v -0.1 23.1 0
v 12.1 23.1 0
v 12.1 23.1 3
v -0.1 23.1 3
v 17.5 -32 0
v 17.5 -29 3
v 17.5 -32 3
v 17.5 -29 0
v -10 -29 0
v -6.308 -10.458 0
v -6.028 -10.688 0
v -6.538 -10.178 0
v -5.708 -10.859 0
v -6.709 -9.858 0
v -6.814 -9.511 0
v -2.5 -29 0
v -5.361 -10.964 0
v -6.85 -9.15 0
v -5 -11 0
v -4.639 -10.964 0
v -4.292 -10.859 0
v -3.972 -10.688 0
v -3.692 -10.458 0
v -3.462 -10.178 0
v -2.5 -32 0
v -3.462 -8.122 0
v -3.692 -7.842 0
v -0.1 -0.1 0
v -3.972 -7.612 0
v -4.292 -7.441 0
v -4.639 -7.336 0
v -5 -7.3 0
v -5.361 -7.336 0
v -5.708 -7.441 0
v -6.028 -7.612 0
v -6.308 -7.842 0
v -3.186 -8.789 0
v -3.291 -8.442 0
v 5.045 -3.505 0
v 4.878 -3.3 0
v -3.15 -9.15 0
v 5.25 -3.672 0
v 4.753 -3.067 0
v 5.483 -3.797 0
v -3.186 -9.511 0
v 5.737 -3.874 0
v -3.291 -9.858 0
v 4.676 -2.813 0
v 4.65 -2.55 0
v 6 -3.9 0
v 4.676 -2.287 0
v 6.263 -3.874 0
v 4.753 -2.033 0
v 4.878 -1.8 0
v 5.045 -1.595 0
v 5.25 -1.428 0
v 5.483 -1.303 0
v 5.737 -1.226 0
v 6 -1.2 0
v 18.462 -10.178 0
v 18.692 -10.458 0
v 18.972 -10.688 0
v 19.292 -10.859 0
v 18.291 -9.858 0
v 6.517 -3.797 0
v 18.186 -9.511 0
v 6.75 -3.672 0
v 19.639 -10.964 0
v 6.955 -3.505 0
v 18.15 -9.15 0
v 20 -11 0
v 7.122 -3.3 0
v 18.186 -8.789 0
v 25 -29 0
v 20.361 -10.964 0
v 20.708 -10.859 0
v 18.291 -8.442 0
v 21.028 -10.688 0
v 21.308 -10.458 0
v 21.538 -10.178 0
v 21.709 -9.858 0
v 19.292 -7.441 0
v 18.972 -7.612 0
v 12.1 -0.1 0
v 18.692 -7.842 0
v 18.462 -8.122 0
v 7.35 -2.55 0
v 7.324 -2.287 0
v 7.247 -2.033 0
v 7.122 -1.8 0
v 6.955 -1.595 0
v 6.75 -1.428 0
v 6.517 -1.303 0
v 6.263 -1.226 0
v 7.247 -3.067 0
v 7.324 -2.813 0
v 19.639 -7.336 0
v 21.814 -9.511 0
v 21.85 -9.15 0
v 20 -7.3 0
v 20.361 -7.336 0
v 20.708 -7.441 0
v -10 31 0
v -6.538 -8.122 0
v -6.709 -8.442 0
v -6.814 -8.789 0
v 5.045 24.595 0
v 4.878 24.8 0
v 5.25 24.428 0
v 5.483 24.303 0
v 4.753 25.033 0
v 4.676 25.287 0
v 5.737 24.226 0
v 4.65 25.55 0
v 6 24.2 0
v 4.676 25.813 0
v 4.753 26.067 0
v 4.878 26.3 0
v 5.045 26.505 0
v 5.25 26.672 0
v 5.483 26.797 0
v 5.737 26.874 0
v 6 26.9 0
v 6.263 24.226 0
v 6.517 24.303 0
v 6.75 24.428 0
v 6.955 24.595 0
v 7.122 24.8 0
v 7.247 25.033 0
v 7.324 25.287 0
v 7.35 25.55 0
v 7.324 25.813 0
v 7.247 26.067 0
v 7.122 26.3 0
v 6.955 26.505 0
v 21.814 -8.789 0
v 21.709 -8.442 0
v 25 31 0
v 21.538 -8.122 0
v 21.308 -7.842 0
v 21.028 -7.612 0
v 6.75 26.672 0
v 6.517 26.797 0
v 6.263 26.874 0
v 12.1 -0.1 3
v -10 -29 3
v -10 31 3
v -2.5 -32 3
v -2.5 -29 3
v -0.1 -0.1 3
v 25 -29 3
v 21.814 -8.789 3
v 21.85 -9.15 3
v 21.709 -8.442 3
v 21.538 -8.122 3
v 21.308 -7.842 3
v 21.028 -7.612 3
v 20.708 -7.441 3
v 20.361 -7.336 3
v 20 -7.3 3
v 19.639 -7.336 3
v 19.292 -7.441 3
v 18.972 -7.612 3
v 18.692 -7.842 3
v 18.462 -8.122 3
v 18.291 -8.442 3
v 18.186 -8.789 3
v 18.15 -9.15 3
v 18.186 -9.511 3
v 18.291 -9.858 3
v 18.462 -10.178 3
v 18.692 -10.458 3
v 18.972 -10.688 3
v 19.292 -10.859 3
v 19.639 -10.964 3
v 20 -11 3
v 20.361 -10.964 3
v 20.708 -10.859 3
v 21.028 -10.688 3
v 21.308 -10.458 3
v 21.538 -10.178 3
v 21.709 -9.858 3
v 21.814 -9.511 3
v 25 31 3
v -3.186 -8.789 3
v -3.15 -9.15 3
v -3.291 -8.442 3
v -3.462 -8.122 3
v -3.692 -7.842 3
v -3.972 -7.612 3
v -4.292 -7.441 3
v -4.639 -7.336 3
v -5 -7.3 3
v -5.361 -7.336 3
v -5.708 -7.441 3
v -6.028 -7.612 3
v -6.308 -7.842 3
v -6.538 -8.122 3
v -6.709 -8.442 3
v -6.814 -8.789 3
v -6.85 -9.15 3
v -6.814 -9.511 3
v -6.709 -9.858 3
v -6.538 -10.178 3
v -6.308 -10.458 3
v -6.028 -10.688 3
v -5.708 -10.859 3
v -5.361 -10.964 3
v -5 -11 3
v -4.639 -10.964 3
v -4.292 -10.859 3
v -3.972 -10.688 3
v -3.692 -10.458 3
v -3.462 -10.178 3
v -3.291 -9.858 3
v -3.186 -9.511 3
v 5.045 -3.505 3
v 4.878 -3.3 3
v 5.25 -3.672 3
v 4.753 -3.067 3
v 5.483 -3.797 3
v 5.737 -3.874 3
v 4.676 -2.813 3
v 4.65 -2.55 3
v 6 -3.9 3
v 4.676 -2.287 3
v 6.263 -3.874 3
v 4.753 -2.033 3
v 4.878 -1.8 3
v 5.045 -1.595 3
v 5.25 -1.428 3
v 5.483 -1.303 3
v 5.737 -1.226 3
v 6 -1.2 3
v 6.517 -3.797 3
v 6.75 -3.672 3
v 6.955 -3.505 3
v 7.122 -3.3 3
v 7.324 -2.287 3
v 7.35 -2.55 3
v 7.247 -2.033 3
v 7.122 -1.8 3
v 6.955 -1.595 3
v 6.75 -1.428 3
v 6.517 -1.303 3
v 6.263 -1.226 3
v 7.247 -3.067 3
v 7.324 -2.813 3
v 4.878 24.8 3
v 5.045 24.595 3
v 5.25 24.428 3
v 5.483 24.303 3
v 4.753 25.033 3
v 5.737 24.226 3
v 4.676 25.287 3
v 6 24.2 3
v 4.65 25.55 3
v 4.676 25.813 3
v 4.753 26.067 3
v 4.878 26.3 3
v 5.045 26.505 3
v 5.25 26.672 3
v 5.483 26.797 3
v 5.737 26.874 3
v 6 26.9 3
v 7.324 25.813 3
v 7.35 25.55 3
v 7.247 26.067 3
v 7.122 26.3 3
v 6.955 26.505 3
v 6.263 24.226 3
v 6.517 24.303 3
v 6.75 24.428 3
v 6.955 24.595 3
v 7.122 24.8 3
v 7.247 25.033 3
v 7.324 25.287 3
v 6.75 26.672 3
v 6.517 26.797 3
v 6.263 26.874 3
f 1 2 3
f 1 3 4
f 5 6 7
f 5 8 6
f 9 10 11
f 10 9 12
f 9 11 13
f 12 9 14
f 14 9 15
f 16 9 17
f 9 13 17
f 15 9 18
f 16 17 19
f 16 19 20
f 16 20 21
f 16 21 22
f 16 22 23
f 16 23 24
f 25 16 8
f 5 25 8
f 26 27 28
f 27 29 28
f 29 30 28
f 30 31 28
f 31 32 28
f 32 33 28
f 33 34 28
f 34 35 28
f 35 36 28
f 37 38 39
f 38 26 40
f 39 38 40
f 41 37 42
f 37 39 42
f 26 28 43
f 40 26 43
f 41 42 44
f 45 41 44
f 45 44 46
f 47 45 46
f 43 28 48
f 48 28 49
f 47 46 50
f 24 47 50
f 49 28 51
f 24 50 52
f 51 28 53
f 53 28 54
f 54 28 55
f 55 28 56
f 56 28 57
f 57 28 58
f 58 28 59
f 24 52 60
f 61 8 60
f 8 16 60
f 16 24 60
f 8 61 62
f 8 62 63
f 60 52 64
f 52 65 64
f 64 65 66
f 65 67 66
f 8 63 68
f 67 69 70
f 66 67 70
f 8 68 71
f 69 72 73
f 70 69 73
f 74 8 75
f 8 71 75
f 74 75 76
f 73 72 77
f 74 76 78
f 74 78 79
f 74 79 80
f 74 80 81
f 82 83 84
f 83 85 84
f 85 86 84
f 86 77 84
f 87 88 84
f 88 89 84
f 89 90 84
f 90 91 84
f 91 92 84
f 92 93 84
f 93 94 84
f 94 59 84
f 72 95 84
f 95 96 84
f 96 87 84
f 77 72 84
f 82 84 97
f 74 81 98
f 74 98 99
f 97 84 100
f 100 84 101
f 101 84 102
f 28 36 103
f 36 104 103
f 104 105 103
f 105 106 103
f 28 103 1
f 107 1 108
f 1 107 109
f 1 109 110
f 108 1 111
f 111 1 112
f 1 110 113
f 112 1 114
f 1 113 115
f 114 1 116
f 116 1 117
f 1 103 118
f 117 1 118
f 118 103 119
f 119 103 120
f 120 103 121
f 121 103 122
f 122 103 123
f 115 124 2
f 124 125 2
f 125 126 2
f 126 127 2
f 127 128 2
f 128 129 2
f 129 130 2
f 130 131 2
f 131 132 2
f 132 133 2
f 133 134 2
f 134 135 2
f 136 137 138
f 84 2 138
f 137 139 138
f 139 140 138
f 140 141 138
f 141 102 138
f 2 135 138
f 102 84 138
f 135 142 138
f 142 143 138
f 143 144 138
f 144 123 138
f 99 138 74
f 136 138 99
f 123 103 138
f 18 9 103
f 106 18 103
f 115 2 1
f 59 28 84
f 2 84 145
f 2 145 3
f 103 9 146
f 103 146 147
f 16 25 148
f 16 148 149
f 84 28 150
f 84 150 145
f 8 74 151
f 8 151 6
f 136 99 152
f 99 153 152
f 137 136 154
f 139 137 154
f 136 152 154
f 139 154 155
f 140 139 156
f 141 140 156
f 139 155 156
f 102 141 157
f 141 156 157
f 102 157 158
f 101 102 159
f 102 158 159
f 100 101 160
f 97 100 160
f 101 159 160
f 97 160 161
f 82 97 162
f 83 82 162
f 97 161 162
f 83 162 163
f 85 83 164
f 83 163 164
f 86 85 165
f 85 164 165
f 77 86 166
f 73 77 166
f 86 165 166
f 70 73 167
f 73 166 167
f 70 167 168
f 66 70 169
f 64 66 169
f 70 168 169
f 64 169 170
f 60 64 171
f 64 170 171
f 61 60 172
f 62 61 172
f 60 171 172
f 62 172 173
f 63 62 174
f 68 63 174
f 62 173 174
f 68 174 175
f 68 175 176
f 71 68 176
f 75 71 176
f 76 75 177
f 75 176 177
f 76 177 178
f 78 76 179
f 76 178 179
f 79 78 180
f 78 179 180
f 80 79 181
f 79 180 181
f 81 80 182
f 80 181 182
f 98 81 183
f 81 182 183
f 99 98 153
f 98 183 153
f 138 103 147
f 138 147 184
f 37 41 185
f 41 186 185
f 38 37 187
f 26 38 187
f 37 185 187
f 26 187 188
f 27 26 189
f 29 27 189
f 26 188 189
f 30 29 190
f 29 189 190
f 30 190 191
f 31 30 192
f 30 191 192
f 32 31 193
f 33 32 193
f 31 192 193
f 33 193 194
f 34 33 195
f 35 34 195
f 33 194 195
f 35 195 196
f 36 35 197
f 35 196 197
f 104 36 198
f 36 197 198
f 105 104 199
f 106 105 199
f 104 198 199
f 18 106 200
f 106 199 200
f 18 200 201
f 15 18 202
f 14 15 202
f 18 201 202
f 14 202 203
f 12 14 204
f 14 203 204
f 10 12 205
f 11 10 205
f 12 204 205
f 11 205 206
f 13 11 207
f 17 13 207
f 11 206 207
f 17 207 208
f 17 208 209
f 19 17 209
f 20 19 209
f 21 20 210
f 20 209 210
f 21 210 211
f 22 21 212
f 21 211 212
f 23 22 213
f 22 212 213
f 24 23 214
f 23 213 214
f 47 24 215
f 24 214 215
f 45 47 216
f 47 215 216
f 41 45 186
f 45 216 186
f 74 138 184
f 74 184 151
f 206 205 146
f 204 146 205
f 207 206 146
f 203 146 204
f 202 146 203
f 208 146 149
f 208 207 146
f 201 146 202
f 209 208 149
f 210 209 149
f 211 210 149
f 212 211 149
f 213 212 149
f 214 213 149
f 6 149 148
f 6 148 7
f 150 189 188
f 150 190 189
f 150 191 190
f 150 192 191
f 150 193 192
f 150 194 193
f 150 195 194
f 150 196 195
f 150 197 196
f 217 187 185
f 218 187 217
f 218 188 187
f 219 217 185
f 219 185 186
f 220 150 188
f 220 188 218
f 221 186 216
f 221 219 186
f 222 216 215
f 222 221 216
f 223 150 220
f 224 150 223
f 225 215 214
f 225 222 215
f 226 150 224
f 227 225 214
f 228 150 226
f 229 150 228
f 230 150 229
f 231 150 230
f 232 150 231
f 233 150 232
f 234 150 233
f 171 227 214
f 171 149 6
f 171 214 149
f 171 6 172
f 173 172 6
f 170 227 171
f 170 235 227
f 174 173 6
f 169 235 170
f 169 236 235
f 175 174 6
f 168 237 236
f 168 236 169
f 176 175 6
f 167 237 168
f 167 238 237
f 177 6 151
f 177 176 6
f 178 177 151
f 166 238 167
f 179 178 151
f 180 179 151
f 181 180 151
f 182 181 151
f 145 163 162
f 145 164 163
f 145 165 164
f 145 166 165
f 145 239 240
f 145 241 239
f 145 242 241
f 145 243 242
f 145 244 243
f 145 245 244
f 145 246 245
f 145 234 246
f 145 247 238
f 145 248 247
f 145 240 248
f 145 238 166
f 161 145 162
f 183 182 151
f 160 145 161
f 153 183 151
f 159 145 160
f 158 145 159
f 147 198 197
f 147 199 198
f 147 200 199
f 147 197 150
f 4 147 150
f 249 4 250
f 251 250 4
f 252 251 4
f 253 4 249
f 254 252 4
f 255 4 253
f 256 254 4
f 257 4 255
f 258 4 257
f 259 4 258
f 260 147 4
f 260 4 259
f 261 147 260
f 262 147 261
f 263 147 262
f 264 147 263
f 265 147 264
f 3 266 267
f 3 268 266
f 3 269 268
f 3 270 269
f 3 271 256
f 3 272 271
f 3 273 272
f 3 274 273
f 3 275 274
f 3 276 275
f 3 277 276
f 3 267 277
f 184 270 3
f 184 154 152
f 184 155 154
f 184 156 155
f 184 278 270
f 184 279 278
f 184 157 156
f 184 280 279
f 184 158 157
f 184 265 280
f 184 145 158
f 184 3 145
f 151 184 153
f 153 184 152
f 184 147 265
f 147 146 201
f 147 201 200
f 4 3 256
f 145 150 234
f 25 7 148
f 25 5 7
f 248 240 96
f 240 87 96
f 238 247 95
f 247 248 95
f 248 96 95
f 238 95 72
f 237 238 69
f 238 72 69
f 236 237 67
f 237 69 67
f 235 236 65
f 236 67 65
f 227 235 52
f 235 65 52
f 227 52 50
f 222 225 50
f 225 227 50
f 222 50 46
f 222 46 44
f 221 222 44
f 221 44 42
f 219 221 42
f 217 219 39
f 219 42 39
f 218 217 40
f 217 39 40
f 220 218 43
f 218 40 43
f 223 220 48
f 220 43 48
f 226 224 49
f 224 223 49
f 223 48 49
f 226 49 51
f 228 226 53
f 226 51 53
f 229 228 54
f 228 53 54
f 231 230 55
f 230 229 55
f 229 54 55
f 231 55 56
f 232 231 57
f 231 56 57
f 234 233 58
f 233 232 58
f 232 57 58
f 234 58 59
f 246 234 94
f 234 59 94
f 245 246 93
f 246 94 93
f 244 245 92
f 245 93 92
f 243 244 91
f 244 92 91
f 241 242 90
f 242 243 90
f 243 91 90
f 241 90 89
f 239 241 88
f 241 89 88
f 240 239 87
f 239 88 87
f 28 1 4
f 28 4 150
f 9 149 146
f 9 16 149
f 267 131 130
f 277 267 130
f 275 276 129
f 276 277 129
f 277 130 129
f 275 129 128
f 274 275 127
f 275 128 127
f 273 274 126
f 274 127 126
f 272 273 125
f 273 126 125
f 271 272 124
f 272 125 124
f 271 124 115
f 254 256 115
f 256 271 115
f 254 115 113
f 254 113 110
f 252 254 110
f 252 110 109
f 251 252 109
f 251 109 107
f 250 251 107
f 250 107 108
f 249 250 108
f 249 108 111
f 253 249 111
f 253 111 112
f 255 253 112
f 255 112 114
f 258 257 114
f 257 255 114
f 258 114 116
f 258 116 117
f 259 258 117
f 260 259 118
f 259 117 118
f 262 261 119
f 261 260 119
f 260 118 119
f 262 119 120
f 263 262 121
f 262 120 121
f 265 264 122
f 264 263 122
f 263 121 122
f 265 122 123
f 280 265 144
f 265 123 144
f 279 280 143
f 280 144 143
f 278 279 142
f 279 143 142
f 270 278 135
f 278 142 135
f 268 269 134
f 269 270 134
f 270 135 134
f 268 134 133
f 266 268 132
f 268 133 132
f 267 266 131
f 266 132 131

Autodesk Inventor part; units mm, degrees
ref_plane "YZ Plane" through (0, 0, 0) normal (1, 0, 0) x (0, 1, 0)
ref_plane "XZ Plane" through (0, 0, 0) normal (0, 1, 0) x (-1, 0, 0)
ref_plane "XY Plane" through (0, 0, 0) normal (0, 0, 1) x (1, 0, 0)
sketch "Sketch1" plane through (0, 0, 0) normal (0, 0, 1) x (1, 0, 0)
  line L0 (12, 23) -> (0, 23) projected
  line L1 (0, 23) -> (0, 0) projected
  line L2 (0, 0) -> (12, 0) projected
  line L3 (12, 0) -> (12, 23) projected
  line L4 (0, 27.5) -> (5.5, 27.5) construction
  line L5 (6.5, 27.5) -> (12, 27.5) construction
  line L6 (0, -4.5) -> (5.5, -4.5) construction
  line L7 (6.5, -4.5) -> (12, -4.5) construction
  line L8 (-10, 3) -> (-10, 31) construction
  line L9 (25, 31) -> (25, 22) construction
  line L10 (25, 12) -> (25, 3) construction
  circle A0 centre (6, 17) radius 2 construction
  circle A1 centre (6, 17) radius 36.225 construction
  circle A2 centre (6, 17) radius 37.6464 construction
  line L11 (-10, 31) -> (25, 31)
  line L12 (25, 31) -> (25, -29)
  line L13 (25, -29) -> (-10, -29)
  line L14 (-10, -29) -> (-10, 31)
  line L15 (7.5, -29) -> (7.5, 31) construction
  line L16 (-2.5, -29) -> (17.5, -29)
  line L17 (17.5, -29) -> (17.5, -32)
  line L18 (17.5, -32) -> (-2.5, -32)
  line L19 (-2.5, -32) -> (-2.5, -29)
  arc A3 (6.5, -3.804) -> (5.5, -3.804) centre (6, -2.55) ccw construction
  arc A4 (5.5, 26.804) -> (6.5, 26.804) centre (6, 25.55) ccw construction
  circle A5 centre (6, 25.55) radius 1.35
  circle A6 centre (6, -2.55) radius 1.35
  line L20 (12.1, 23.1) -> (-0.1, 23.1)
  line L21 (-0.1, 23.1) -> (-0.1, -0.1)
  line L22 (-0.1, -0.1) -> (12.1, -0.1)
  line L23 (12.1, -0.1) -> (12.1, 23.1)
  point P0 (22, -15.5)
  point P1 (25, -15.5)
  dimension "d0" = 60
  dimension "d1" = 3
  dimension "d2" = 10
  dimension "d3" = 10
  dimension "d4" = 0.1
  dimension "d5" = 0.1
  dimension "d6" = 0.1
  dimension "d7" = 0.1
extrude "Extrusion1" add sketch "Sketch1" along normal blind 3 contours L11 L12 L13 L14 | L13 L17 L18 L19
sketch "Sketch2" plane through (0, 0, 3) normal (0, 0, 1) x (1, 0, 0)
  circle A0 centre (-5, -9.15) radius 1.85 projected
  circle A1 centre (20, -9.15) radius 1.85 projected
  point P0 (0, 0)
extrude "Extrusion2" cut sketch "Sketch2" against normal blind 6.175
properties part number "Camera mount raiser"
